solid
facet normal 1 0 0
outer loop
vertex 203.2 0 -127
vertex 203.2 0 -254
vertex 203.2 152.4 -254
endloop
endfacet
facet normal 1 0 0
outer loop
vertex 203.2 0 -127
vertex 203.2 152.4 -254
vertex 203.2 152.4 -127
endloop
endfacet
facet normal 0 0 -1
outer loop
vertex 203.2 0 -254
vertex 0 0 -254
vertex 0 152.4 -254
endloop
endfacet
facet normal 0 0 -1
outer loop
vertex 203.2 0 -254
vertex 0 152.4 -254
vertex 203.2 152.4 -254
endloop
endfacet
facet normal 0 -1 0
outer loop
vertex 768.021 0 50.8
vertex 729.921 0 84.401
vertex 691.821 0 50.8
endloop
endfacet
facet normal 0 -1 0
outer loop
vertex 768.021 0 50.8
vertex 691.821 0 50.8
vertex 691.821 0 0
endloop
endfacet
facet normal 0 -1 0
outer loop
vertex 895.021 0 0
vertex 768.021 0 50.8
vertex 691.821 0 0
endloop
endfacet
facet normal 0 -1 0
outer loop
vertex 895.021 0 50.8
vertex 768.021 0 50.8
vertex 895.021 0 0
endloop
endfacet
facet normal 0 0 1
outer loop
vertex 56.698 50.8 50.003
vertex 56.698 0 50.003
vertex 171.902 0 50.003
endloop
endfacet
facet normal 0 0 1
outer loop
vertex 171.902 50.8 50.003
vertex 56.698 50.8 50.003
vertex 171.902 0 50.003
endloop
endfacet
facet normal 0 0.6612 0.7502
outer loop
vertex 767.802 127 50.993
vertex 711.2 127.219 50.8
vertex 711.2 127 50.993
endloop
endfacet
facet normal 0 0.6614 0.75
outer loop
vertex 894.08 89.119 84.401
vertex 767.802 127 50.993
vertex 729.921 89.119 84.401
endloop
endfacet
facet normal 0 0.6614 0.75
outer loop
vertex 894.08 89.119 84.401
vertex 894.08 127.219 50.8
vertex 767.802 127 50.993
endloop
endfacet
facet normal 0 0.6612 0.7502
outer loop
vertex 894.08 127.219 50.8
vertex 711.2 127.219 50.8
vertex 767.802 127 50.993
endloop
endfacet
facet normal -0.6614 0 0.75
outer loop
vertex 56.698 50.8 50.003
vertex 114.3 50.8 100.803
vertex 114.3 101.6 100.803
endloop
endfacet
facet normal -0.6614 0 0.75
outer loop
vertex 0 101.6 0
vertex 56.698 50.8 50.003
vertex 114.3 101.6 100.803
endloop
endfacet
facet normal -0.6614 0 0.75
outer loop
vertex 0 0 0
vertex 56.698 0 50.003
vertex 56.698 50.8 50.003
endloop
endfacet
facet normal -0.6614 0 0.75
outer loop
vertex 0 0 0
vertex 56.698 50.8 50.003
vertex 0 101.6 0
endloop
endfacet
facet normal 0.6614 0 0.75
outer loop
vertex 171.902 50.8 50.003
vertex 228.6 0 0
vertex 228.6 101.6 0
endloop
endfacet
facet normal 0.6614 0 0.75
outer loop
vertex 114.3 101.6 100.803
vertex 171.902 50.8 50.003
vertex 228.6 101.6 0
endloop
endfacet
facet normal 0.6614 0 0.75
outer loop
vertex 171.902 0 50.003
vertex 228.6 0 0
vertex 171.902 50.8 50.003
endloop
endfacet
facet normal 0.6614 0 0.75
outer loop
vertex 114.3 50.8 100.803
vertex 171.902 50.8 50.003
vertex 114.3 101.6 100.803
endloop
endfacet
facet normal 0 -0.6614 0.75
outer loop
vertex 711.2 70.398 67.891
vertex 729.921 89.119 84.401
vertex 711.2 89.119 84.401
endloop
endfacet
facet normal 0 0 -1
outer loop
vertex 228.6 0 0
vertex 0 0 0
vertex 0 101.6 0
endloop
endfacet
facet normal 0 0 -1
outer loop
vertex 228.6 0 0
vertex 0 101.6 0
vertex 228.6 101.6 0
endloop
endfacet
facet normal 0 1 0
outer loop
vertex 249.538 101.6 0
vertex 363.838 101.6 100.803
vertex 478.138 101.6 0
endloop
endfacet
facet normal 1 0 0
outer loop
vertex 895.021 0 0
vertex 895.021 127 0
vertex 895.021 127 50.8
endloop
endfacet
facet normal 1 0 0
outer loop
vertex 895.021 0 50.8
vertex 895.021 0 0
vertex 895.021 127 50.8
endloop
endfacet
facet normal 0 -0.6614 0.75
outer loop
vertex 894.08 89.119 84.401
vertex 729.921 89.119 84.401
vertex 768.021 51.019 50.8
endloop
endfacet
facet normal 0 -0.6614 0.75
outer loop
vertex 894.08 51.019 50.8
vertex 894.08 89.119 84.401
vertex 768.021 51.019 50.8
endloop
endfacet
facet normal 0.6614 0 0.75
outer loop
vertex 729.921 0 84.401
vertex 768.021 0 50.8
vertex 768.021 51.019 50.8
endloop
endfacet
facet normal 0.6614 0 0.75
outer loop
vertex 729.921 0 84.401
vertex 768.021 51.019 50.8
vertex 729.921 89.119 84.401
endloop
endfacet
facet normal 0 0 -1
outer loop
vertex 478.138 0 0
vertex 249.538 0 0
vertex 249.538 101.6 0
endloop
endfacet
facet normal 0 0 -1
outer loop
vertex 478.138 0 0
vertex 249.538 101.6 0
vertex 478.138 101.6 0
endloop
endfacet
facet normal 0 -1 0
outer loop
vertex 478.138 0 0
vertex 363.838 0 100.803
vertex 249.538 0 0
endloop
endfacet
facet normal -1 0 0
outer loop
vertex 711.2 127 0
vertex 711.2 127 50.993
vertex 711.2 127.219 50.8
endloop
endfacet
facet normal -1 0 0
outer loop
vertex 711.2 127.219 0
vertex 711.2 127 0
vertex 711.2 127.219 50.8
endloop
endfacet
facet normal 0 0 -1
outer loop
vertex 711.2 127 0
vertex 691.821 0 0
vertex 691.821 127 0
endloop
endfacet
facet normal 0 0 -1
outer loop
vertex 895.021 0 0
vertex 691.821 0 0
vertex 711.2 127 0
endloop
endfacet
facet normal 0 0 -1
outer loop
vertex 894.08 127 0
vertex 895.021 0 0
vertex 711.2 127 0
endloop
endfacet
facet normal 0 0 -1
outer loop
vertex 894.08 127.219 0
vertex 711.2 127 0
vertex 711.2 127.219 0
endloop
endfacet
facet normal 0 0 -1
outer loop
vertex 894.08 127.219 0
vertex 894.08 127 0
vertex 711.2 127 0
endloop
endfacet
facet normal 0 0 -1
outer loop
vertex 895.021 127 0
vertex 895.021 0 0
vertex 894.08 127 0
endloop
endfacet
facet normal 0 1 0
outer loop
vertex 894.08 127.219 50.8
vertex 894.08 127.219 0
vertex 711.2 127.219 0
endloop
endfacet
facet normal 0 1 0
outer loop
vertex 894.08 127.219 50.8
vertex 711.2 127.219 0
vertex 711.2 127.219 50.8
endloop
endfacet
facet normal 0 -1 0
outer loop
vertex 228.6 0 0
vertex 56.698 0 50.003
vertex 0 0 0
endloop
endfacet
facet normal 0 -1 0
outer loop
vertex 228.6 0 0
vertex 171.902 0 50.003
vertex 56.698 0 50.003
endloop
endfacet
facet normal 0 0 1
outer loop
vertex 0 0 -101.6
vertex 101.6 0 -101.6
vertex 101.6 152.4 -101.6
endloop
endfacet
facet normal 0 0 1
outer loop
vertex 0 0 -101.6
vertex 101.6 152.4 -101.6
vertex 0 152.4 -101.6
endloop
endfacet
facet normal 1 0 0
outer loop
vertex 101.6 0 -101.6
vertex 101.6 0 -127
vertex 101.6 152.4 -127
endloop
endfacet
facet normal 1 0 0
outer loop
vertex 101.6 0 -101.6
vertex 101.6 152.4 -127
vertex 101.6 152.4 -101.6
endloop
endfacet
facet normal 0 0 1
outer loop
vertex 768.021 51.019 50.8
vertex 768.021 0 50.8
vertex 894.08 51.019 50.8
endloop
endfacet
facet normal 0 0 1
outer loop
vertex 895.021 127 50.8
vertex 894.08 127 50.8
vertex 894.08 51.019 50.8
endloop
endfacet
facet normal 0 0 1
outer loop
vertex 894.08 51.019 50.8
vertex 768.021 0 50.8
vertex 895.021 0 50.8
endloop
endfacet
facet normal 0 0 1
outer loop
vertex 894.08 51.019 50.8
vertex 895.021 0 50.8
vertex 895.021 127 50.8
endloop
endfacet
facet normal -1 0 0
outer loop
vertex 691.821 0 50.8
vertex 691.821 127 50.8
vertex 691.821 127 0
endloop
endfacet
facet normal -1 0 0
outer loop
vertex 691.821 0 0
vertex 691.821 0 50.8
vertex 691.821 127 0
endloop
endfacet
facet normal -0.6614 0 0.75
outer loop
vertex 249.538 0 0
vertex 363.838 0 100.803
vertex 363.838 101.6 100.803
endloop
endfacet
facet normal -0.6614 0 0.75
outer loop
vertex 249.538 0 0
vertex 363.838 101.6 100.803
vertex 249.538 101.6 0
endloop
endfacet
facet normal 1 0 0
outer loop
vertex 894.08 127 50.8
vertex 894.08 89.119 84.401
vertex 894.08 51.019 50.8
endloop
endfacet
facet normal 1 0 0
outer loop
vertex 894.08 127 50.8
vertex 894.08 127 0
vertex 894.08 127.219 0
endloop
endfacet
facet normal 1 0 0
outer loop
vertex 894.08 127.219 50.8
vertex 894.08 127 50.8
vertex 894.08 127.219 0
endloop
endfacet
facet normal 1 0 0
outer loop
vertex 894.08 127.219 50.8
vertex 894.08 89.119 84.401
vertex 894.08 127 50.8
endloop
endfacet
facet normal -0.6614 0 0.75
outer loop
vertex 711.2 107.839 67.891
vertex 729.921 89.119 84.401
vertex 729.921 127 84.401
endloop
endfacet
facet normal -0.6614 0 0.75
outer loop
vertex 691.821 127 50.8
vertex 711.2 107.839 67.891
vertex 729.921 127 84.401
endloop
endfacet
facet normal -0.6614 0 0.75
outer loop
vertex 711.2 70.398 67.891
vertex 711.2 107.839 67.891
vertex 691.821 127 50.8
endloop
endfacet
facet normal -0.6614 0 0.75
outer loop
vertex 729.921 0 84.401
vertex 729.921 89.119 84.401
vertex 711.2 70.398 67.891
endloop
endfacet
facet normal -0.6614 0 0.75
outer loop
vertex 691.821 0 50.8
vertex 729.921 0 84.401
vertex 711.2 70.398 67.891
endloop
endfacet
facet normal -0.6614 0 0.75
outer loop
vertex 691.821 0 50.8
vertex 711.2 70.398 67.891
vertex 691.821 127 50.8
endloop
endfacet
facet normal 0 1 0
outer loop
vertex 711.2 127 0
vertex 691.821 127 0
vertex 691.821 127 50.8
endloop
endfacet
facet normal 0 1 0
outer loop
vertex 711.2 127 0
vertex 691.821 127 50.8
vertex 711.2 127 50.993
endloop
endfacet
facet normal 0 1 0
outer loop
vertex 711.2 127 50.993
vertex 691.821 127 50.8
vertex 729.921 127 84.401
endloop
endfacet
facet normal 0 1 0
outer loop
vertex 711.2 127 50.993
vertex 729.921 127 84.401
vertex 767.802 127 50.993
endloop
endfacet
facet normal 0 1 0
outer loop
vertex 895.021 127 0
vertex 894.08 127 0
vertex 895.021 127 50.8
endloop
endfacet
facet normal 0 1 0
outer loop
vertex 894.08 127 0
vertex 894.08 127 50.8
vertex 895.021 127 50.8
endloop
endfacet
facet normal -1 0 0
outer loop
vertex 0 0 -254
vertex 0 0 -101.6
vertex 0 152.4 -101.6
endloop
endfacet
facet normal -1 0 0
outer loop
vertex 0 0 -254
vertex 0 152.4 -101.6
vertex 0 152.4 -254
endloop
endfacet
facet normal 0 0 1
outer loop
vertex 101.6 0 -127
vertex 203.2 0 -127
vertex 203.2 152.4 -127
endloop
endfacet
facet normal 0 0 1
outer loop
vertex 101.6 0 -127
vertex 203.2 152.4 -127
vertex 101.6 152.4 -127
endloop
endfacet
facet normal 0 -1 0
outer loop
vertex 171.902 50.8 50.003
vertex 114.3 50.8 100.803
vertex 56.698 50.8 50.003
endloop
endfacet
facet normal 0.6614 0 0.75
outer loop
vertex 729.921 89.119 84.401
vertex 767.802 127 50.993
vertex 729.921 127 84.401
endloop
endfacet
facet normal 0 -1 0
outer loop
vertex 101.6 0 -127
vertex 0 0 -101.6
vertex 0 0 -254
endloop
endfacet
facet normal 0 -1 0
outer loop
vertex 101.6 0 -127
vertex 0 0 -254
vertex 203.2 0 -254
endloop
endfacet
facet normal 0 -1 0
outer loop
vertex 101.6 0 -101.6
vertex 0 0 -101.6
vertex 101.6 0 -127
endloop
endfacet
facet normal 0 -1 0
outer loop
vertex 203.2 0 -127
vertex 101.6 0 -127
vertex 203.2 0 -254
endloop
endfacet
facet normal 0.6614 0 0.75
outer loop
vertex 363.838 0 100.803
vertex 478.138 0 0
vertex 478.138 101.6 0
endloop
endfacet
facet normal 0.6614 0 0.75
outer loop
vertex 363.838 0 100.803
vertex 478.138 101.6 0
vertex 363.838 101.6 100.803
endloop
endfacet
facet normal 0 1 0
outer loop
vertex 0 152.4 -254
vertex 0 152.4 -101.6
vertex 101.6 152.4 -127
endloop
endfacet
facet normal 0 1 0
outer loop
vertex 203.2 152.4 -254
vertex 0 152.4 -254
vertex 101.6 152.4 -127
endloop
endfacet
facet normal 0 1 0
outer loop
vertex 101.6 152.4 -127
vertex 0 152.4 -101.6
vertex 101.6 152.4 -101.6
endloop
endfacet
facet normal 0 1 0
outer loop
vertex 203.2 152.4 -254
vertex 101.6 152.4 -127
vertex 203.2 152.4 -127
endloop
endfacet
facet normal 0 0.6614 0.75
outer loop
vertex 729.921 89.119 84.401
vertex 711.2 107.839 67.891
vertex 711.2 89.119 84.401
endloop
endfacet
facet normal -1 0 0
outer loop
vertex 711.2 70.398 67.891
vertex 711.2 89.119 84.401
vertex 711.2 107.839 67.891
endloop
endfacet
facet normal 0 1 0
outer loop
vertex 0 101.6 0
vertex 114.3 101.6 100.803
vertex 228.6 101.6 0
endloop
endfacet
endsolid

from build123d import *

# Parameters (mm, degrees)
F1_DEPTH  = 101.6
F3_DEPTH  = 50.8
F4_DEPTH  = 50.8
F6_DEPTH  = 101.6
F9_DEPTH  = 279.4
F11_DEPTH = 127
F12_W     = 127
F12_H     = 50.8
F13_DEPTH = 127
F14_W     = 76.2
F14_H     = 50.8
F15_DEPTH = 182.88
F17_DEPTH = 152.4


with BuildPart() as f1:
    # F0 (on Front) → F1 (new body)
    with BuildSketch(Plane.XZ):
        Polygon((114.3, 100.8031249516), (0, 0), (228.6, 0), align=None)
    extrude(amount=-F1_DEPTH)

    # F2 (on face) → F3 (join)
    with BuildSketch(Plane.XZ):
        Polygon((114.3, 100.8031249516), (56.6982143134, 50.0031249516), (171.9017856866, 50.0031249516), align=None)
    extrude(amount=-F3_DEPTH)

    # F2 (on face) → F4 (cut)
    with BuildSketch(Plane.XZ):
        Polygon((114.3, 100.8031249516), (56.6982143134, 50.0031249516), (171.9017856866, 50.0031249516), align=None)
    extrude(amount=-F4_DEPTH, mode=Mode.SUBTRACT)

    # F8 (on offset) → F9 (cut)
    with BuildSketch(Plane.YZ.offset(894.08)):
        Polygon((0, 24.6031249516), (50.8, 100.8031249516), (0, 100.8031249516), align=None)
    extrude(amount=-F9_DEPTH, mode=Mode.SUBTRACT)


with BuildPart() as f6:
    # F5 (on Front) → F6 (new body)
    with BuildSketch(Plane.XZ):
        Polygon((420.9883213043, 50.4015624758), (363.8383213043, 100.8031249516), (306.6883213043, 50.4015624758), align=None)
        Polygon((420.9883213043, 50.4015624758), (306.6883213043, 50.4015624758), (249.5383213043, 0), (478.1383213043, 0), align=None)
    extrude(amount=-F6_DEPTH)


with BuildPart() as f11:
    # F10 (on Front) → F11 (new body)
    with BuildSketch(Plane.XZ):
        Polygon((729.9206214905, 84.4010416505), (691.8206214905, 50.8), (691.8206214905, 0), (768.0206214905, 0), (768.0206214905, 50.8), align=None)
    extrude(amount=-F11_DEPTH)

    # F12 (on Front) → F13 (join)
    with BuildSketch(Plane.XZ):
        with Locations((831.5206214905, 25.4)):
            Rectangle(F12_W, F12_H)
    extrude(amount=-F13_DEPTH)

    # F14 (on offset) → F15 (join)
    with BuildSketch(Plane.YZ.offset(894.08)):
        Polygon((127.2188145703, 50.8), (89.1188145703, 84.4010416505), (51.0188145703, 50.8), align=None)
        with Locations((89.1188145703, 25.4)):
            Rectangle(F14_W, F14_H)
    extrude(amount=-F15_DEPTH)


with BuildPart() as f17:
    # F16 (on Front) → F17 (new body)
    with BuildSketch(Plane.XZ):
        Polygon((101.6, -101.6), (0, -101.6), (0, -254), (203.2, -254), (203.2, -127), (101.6, -127), align=None)
    extrude(amount=-F17_DEPTH)


solid = Compound([f1.part, f6.part, f11.part, f17.part])
